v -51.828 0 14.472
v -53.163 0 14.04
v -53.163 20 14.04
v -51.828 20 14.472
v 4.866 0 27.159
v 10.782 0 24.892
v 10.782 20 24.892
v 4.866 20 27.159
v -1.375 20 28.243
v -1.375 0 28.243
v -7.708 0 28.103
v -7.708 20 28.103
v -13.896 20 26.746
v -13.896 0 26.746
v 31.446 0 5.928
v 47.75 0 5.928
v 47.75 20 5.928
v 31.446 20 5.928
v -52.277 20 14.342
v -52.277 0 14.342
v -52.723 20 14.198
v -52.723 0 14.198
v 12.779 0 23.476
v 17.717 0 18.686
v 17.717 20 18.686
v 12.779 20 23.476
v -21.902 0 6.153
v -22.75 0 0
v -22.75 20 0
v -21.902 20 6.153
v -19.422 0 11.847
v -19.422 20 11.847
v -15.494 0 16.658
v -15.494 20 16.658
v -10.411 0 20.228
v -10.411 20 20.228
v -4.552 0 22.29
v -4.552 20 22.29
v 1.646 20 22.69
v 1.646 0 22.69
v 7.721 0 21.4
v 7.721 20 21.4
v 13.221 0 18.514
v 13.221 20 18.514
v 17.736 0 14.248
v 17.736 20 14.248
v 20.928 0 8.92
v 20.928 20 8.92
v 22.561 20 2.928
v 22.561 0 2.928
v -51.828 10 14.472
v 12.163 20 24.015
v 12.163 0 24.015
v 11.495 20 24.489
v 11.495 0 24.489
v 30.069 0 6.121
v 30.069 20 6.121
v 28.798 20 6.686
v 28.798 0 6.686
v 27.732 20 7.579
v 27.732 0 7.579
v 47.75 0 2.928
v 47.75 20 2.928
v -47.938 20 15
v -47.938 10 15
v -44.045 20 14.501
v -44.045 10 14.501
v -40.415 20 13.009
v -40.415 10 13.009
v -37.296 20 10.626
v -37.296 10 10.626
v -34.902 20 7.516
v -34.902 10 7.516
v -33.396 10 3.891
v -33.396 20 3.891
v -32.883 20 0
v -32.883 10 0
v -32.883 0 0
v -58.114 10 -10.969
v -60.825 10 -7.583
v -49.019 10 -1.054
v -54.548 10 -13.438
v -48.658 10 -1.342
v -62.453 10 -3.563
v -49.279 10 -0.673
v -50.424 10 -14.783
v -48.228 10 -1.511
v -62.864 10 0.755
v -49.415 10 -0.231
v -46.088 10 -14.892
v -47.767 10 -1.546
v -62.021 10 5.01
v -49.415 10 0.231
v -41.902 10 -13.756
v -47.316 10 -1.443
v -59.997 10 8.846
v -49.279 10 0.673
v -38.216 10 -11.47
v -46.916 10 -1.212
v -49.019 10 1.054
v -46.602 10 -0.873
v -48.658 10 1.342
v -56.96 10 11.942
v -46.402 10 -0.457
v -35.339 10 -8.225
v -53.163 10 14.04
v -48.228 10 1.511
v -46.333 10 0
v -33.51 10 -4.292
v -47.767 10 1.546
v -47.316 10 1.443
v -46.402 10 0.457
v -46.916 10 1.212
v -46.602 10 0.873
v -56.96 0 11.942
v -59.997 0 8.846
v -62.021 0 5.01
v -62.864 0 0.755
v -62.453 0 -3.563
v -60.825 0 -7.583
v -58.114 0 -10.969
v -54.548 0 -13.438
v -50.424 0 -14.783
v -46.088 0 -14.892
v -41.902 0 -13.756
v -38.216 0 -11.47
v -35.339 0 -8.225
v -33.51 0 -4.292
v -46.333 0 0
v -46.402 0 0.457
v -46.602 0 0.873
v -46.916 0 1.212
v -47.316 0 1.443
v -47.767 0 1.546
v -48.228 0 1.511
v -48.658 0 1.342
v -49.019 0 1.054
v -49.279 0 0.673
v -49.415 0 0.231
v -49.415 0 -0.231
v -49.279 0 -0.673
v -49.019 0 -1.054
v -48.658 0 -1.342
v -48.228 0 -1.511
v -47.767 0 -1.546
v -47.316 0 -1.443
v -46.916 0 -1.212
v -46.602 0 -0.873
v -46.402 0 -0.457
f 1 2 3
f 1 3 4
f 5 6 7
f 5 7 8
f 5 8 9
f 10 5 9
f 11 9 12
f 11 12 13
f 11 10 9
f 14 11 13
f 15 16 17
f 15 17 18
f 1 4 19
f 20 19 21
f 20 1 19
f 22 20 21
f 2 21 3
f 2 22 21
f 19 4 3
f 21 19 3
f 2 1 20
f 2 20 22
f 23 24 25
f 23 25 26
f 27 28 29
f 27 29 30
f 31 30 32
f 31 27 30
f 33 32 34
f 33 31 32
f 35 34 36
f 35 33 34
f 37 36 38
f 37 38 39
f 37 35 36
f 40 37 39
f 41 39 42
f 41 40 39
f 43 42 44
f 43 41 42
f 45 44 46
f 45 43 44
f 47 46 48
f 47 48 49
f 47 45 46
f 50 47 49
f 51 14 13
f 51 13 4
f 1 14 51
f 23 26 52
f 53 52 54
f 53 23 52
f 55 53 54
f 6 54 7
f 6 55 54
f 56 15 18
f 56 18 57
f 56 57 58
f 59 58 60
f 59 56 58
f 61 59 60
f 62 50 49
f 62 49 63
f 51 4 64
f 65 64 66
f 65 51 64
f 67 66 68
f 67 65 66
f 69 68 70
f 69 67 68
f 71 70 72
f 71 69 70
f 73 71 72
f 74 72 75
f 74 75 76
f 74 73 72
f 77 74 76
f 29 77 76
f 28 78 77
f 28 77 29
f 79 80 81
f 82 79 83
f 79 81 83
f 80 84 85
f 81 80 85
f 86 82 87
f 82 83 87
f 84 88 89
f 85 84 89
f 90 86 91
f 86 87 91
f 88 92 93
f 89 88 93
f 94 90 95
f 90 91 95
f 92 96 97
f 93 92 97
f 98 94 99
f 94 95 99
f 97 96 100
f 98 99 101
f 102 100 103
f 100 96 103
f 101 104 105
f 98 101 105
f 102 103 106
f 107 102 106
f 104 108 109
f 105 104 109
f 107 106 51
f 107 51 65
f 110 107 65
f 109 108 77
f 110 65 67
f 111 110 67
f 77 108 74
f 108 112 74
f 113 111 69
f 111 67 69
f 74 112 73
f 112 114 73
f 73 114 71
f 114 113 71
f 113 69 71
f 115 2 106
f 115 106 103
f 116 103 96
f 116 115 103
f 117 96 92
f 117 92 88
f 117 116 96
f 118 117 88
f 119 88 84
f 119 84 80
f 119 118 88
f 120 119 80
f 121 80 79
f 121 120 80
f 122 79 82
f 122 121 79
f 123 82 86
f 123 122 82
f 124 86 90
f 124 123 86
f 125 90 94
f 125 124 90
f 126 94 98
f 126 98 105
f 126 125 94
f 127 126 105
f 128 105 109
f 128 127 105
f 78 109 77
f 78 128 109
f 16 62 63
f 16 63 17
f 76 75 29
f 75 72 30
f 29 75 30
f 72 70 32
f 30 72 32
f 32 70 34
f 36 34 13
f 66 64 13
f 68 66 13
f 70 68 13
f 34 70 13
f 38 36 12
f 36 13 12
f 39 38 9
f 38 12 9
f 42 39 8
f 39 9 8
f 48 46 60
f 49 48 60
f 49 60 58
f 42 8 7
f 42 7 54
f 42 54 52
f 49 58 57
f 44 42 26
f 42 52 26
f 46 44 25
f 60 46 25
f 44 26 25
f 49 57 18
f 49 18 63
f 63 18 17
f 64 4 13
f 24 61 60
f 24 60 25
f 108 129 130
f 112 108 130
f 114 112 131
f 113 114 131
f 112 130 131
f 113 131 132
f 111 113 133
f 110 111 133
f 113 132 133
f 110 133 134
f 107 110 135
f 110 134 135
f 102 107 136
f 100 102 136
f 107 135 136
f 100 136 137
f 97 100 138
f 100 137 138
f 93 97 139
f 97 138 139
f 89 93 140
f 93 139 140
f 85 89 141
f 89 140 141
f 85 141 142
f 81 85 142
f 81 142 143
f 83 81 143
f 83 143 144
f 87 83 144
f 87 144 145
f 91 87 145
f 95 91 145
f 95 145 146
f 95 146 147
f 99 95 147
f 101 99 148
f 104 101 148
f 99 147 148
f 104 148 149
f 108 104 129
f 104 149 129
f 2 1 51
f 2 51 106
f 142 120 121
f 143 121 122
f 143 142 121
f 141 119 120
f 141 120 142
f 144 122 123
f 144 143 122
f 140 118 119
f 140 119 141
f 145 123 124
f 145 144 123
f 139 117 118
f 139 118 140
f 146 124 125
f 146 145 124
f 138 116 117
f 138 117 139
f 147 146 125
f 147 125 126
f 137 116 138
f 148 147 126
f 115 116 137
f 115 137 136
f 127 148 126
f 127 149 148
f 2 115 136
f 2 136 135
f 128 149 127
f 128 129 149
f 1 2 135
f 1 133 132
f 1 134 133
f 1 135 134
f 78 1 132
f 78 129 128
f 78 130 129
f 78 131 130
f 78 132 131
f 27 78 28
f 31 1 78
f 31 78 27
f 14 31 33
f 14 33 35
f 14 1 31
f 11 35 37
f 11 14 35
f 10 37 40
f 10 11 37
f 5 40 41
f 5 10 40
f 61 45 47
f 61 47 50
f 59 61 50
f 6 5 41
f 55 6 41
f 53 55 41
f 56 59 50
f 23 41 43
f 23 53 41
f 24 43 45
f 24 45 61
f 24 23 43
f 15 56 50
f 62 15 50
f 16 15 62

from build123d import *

# Parameters (mm, degrees)
F1_DEPTH = 20
F0_R     = 1.55
F2_DEPTH = 10


with BuildPart() as f1:
    # F0 (on Front) → F1 (new body)
    with BuildSketch(Plane.XZ):
        with BuildLine():
            ThreePointArc((-22.75, 0), (-1.4668388401, 22.702662483), (22.560846929, 2.9275733717))
            Line((22.560846929, 2.9275733717), (25.5830376256, 2.9275733717))
            Line((25.5830376256, 2.9275733717), (47.75, 2.9275733717))
            Line((47.75, 2.9275733717), (47.75, 5.9275733717))
            Line((47.75, 5.9275733717), (31.4456390027, 5.9275733717))
            ThreePointArc((31.4456390027, 5.9275733717), (29.4136159552, 6.3591072905), (27.7323476553, 7.5792204378))
            Line((27.7323476553, 7.5792204378), (17.7172674824, 18.6858484677))
            Line((17.7172674824, 18.6858484677), (12.7792477744, 23.4759662812))
            ThreePointArc((12.7792477744, 23.4759662812), (11.8349502961, 24.2607131327), (10.7816891456, 24.8917173301))
            ThreePointArc((10.7816891456, 24.8917173301), (-1.3748763237, 28.2426544781), (-13.8956863698, 26.7459315358))
            Line((-13.8956863698, 26.7459315358), (-51.8277890626, 14.4719109537))
            ThreePointArc((-51.8277890626, 14.4719109537), (-38.7771016598, 11.9200767766), (-32.8826916814, 0))
            Line((-32.8826916814, 0), (-25.75, 0))
            Line((-25.75, 0), (-22.75, 0))
        make_face()
    extrude(amount=-F1_DEPTH)

    # F0 (on Front) → F2 (join)
    with BuildSketch(Plane.XZ):
        with BuildLine():
            ThreePointArc((-53.1633601138, 14.0397486056), (-56.4205477798, -12.33308612), (-32.8826916814, 0))
            ThreePointArc((-32.8826916814, 0), (-38.7771016598, 11.9200767766), (-51.8277890626, 14.4719109537))
            Line((-51.8277890626, 14.4719109537), (-53.1633601138, 14.0397486056))
        make_face()
        with Locations((-47.8826916814, 0)):
            Circle(F0_R, mode=Mode.SUBTRACT)
    extrude(amount=-F2_DEPTH)


with BuildPart() as f1b:
    # F0 (on Front) → F1, piece 2 (new body)
    with BuildSketch(Plane.XZ):
        with BuildLine():
            ThreePointArc((-51.8277890626, 14.4719109537), (-52.5006327578, 14.2714617406), (-53.1633601138, 14.0397486056))
            Line((-53.1633601138, 14.0397486056), (-51.8277890626, 14.4719109537))
        make_face()
    extrude(amount=-F1_DEPTH)


solid = Compound([f1.part, f1b.part])
